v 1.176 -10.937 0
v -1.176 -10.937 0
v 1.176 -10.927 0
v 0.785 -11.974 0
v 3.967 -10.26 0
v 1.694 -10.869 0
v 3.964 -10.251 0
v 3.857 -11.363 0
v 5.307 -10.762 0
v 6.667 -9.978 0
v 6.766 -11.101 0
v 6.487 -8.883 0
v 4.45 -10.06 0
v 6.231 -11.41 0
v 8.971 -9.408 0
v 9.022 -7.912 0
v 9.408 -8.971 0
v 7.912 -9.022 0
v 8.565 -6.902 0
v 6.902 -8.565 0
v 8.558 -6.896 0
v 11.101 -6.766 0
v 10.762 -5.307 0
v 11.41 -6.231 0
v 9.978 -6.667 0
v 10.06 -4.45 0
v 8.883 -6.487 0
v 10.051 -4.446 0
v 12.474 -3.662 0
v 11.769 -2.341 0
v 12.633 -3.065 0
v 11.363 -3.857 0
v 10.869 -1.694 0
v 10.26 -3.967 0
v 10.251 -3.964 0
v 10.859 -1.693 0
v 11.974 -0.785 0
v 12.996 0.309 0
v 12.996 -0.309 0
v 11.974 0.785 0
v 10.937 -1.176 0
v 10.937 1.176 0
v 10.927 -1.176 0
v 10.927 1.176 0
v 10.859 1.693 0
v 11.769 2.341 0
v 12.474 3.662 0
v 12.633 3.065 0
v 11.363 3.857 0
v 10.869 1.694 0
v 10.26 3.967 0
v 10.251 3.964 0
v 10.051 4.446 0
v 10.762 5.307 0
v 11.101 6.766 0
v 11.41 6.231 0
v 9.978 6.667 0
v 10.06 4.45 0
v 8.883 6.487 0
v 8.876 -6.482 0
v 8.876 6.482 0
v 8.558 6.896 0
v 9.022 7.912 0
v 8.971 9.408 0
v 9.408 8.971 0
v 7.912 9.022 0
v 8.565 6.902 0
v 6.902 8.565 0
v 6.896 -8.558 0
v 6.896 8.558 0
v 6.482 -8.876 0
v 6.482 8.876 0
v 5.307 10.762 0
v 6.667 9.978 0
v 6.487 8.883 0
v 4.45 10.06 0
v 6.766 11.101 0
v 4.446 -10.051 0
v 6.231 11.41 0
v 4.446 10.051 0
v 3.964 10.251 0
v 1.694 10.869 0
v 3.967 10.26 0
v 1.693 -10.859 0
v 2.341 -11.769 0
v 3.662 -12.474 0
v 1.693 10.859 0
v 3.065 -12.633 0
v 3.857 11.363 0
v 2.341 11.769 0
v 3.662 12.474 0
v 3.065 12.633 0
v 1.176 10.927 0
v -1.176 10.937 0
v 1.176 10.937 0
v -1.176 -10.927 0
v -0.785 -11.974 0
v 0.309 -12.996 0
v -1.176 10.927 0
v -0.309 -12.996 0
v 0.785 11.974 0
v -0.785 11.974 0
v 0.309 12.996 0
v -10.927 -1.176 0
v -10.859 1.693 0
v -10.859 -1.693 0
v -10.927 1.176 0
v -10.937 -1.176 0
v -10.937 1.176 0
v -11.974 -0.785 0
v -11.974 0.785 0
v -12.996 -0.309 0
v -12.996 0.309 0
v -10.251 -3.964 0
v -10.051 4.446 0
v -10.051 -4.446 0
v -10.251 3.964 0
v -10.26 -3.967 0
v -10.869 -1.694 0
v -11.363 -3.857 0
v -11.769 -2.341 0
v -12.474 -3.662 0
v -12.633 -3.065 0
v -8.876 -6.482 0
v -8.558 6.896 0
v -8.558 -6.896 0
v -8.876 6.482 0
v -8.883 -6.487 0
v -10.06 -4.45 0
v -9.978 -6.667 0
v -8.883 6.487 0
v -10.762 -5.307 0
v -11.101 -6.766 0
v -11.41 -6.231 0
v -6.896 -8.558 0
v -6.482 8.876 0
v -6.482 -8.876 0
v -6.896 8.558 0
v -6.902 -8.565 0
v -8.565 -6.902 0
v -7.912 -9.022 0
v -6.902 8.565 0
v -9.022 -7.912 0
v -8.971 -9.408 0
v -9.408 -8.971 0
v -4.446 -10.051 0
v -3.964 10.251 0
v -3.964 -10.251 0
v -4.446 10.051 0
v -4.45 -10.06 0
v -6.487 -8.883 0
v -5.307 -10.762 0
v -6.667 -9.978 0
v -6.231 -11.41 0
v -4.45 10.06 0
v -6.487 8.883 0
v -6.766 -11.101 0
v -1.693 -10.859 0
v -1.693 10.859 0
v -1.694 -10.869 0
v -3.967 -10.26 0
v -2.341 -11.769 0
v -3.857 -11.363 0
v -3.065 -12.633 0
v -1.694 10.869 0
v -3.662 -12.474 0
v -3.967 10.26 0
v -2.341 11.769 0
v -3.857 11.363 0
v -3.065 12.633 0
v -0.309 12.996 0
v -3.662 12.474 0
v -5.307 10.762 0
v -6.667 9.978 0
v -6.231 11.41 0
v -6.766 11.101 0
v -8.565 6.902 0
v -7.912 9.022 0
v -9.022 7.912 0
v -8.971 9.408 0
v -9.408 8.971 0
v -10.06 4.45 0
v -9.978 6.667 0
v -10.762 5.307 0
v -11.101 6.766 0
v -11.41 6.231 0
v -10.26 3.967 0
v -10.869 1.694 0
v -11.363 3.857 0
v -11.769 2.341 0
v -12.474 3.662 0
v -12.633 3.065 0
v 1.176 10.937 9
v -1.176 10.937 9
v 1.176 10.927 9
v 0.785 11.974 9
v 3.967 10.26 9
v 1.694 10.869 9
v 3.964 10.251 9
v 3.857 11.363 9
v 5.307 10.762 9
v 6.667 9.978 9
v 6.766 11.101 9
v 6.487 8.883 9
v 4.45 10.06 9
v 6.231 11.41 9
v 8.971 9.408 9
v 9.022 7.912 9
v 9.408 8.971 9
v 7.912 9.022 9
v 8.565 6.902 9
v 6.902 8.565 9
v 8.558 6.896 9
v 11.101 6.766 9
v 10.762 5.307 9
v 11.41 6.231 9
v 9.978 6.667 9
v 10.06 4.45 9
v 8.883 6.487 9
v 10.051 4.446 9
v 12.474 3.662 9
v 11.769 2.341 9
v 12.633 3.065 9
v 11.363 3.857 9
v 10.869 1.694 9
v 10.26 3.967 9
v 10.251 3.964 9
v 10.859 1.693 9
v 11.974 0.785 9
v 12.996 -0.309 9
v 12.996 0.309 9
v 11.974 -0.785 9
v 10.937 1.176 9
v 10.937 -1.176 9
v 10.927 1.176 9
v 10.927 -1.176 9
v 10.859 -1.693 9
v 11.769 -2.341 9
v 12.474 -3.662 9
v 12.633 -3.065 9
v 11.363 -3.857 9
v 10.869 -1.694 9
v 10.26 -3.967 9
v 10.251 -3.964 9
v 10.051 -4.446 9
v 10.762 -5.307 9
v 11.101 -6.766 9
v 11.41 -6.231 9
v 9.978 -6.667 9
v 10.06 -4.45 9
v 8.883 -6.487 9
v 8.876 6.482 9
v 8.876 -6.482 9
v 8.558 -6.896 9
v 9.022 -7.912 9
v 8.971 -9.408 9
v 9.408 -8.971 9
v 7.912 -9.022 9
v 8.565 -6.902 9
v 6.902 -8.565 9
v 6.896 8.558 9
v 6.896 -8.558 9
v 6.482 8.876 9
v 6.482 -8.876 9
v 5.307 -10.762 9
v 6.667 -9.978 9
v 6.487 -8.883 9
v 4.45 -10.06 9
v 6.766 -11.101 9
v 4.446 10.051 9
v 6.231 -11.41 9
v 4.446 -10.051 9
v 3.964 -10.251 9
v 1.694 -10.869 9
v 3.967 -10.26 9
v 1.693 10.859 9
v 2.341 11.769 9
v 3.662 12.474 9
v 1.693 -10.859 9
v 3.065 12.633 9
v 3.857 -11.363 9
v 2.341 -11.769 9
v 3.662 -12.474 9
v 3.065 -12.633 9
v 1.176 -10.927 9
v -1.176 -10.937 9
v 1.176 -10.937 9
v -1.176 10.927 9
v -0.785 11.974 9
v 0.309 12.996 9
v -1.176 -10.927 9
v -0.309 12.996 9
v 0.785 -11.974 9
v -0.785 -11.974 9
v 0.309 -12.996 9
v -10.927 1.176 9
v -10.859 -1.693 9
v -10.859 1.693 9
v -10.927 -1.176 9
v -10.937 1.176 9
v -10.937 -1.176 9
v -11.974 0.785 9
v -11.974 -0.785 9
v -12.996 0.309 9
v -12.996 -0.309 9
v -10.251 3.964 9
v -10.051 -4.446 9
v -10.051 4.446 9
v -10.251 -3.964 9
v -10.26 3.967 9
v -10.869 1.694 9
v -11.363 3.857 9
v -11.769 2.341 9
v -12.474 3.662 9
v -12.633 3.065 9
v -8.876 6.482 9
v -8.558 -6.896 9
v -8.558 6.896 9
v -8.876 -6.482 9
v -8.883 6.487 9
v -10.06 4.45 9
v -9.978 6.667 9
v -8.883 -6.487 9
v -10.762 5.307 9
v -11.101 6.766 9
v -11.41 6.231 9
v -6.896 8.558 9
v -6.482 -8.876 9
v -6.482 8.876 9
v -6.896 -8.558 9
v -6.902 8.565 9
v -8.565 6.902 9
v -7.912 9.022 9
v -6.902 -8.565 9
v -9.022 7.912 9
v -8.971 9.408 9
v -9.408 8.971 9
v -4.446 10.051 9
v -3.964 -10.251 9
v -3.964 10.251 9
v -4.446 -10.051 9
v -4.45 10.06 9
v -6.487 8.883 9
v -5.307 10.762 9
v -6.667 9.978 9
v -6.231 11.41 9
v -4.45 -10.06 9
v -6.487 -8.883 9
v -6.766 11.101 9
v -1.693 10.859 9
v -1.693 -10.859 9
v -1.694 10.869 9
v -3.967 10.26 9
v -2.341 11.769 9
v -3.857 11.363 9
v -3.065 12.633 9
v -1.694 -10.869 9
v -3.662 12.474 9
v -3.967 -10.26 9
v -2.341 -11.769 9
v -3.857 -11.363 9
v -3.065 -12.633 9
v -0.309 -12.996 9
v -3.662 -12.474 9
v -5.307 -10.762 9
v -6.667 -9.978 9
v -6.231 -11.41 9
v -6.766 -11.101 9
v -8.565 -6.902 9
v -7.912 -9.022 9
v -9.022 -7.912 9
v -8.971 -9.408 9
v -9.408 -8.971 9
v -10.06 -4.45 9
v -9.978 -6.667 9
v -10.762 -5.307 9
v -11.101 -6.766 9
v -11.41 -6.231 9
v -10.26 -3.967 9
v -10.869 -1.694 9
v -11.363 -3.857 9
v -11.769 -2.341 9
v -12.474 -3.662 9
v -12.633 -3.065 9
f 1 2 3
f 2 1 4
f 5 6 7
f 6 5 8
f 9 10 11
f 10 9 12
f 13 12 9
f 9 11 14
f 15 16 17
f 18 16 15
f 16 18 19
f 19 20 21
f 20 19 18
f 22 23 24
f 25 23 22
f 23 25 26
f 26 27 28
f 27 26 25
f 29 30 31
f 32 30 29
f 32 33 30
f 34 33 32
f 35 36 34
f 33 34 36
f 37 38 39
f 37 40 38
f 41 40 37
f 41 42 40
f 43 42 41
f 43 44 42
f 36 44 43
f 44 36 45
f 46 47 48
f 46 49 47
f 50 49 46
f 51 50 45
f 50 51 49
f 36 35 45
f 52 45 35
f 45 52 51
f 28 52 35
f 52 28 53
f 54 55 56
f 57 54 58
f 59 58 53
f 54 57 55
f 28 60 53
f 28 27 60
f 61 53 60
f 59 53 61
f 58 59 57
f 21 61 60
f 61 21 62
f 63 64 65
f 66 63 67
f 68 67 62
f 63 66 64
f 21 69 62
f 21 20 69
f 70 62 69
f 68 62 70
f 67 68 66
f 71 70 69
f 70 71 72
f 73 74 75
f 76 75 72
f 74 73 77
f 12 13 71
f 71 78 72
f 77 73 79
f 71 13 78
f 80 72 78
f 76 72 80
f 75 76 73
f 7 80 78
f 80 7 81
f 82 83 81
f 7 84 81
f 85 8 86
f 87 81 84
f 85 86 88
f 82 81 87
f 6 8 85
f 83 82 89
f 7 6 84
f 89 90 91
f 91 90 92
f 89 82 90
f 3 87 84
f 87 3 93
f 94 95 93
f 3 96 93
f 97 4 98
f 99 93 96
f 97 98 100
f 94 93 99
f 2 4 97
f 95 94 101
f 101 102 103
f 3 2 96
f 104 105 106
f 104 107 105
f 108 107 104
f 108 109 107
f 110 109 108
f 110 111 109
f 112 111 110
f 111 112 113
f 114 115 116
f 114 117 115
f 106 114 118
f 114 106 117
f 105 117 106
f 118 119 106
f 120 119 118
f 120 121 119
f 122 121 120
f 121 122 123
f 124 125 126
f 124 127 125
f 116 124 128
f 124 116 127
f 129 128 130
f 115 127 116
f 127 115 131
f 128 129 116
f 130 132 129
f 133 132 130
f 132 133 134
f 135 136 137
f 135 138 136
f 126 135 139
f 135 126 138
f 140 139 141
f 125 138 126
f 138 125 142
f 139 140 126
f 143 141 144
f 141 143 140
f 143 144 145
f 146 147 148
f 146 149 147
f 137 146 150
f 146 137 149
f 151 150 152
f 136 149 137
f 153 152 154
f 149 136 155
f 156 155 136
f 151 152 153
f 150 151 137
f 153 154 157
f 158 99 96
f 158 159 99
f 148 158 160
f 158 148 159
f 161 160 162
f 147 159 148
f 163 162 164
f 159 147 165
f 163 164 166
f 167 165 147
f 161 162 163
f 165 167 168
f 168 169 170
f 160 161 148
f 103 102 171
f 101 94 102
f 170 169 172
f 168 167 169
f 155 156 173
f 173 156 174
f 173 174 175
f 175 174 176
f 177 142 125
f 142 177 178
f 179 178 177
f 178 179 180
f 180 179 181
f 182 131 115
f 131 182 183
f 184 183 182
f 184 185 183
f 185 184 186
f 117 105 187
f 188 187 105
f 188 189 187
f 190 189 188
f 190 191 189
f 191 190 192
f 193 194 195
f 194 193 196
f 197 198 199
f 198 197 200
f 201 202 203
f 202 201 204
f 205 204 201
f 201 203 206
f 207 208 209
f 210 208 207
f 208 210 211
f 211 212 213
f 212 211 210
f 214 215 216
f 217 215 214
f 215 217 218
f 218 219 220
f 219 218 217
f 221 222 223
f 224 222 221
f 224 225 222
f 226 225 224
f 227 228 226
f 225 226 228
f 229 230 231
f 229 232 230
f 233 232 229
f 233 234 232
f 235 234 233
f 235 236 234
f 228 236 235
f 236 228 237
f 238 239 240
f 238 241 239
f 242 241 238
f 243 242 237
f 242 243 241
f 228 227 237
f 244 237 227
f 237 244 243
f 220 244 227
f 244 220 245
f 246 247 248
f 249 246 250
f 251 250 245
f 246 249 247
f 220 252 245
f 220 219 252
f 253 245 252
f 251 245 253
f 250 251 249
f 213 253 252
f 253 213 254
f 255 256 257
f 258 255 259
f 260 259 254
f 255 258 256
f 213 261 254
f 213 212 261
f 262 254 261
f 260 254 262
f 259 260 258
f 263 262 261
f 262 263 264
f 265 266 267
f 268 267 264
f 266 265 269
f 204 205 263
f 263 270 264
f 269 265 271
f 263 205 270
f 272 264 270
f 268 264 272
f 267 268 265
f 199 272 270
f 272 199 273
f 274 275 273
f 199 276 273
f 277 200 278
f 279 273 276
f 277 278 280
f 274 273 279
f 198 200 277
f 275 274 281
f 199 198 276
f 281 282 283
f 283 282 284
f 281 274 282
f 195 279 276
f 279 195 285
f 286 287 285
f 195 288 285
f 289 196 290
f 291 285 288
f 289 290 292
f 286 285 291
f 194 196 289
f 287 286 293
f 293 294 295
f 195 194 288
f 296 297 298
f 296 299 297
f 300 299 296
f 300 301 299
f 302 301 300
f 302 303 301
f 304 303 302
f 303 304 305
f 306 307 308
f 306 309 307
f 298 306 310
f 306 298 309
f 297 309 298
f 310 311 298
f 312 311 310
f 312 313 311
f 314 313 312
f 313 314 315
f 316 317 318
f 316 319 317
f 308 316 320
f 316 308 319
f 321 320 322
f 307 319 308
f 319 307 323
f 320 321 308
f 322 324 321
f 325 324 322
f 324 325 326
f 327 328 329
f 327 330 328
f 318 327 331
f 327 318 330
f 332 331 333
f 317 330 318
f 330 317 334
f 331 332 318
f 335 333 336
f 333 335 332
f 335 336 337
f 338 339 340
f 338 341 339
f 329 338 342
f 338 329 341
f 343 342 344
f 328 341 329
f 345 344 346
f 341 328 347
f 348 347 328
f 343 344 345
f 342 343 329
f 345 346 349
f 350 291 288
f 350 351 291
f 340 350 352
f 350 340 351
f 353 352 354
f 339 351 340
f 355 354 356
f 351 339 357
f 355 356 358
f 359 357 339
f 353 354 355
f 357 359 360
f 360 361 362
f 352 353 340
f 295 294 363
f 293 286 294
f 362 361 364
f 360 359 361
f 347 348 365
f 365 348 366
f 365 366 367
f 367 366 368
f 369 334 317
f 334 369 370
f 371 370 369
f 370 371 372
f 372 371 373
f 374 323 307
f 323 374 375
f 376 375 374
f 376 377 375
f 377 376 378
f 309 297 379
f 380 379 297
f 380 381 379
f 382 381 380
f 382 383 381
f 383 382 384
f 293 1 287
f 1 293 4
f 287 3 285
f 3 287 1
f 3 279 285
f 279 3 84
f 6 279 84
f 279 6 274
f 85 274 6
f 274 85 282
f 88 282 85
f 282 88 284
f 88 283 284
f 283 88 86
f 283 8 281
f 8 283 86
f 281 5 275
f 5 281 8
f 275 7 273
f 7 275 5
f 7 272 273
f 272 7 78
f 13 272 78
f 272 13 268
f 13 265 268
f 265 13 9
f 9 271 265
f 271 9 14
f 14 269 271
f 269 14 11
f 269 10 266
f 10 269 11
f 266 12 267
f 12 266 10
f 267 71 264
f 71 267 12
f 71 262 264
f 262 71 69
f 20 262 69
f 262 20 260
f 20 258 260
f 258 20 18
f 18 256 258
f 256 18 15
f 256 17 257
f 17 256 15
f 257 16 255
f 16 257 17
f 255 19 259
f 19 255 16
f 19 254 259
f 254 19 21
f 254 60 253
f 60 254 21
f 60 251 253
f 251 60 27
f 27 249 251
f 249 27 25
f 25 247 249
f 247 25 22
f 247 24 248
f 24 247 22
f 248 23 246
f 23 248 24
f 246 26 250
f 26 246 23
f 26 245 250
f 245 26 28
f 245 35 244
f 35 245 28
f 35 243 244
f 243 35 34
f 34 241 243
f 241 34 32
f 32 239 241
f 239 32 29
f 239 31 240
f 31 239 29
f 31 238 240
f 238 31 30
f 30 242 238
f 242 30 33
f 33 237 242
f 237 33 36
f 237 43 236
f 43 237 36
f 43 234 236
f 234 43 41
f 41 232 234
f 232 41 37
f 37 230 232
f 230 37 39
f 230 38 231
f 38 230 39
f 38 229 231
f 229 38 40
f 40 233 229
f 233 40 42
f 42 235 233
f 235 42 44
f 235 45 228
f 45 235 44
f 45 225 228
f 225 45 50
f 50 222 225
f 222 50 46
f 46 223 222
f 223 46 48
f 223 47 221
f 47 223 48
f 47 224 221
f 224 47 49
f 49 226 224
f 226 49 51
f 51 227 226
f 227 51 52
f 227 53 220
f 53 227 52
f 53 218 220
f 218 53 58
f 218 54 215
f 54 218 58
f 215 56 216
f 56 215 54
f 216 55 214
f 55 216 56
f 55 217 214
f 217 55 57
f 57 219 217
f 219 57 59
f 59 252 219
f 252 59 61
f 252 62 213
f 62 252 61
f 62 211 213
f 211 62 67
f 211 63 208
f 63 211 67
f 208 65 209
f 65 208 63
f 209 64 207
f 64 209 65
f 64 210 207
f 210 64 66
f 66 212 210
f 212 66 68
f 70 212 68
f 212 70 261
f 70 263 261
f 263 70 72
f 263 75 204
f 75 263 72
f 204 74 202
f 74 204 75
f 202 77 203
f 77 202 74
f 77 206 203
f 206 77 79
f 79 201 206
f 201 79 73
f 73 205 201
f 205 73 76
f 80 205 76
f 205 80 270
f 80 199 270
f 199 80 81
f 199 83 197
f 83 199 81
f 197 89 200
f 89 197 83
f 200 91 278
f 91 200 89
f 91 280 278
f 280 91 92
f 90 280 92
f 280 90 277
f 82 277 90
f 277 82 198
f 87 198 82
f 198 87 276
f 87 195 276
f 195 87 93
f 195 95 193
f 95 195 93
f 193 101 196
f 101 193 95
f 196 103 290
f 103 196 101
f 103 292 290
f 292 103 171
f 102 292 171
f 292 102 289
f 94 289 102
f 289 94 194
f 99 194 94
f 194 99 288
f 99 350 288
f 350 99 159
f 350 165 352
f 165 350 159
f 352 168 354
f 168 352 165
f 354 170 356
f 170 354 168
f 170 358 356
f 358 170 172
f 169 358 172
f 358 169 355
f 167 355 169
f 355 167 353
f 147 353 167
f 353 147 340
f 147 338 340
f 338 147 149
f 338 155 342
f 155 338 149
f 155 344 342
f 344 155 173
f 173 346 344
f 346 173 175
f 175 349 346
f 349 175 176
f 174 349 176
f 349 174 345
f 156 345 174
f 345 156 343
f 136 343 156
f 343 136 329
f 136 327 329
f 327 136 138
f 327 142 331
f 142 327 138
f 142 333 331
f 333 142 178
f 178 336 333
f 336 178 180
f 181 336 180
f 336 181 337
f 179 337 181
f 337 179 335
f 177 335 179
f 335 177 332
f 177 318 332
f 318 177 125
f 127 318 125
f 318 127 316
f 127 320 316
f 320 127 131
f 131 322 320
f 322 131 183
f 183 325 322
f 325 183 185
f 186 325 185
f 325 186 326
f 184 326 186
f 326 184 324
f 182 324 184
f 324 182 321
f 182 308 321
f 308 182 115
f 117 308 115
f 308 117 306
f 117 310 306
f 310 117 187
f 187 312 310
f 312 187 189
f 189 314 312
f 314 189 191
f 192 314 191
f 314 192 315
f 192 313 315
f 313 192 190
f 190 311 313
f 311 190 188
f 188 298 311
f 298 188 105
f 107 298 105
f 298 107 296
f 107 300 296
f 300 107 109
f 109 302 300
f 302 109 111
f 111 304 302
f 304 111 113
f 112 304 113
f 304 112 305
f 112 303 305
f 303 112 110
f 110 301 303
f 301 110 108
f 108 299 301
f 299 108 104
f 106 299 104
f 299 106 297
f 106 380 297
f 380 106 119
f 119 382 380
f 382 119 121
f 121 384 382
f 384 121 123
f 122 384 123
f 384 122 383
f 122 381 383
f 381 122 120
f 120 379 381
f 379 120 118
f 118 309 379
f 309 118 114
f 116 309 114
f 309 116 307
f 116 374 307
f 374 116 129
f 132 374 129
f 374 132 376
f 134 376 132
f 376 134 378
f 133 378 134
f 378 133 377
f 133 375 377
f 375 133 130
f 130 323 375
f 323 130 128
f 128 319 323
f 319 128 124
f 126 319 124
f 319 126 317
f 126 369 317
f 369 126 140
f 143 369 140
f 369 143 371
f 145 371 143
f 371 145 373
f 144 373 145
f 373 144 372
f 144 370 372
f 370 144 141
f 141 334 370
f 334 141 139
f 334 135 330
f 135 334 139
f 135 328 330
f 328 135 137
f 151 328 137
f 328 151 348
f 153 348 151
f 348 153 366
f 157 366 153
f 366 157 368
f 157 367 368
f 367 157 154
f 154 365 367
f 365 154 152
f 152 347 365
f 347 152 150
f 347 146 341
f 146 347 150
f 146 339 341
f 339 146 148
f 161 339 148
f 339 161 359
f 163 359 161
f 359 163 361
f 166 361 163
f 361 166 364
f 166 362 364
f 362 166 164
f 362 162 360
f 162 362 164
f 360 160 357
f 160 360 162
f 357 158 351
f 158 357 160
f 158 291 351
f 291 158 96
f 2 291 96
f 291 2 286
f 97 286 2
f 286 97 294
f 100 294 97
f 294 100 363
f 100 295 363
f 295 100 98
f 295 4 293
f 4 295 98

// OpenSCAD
// Edited for Celestron telescope control as I wanted a solid gear, with
// Lego looking a nice tooth size
// Original source, Brian Jepson and Robert Munafo:
//   https://www.thingiverse.com/thing:40410/files
// Also reports the outer diameter for planning

// Alorithmic LEGO(r) Technic compatible gear generator
//
// NOTE regarding Patents: Since 1977 the LEGO Group has produced "Technic"
// elements with gear teeth, axles, axle-holes, and other features closely
// resembling the design(s) in this file, as part of their "Expert Builder"
// and "Technical Sets", now called "Technic" (see for example set 961,
// peeron.com/inv/sets/961-1?showpic=9288 ). By 1989 they had added pieces
// with rounded ends (see peeron.com/inv/sets/5264-1?showpic=8542 (set 5264
// from 1987) and peeron.com/inv/sets/5110-2?showpic=8543 (set 5110 from 1989))
// The object(s) produced by this SCAD file are different from real LEGO(r)
// elements, and any similarities of features, such as the shapes of axles
// and axle-holes, are functional in nature. The functions in question
// resemble those in LEGO patents that have already expired (or, if not
// patented, became prior art when the product(s) became available for
// purchase, i.e. 1989 at the latest). Nevertheless, one must not infringe
// on non-expired patents and any non-patent rights, such as LEGO(r)
// trademarks and brand identity. An example of such infringement would be
// to make objects and then try to "pass them off" as LEGO products. See
// for example the Kirkbi AG v. Ritvik Holdings Inc. case, (Supreme Court of
// Canada [2005] 3 S.C.R. 302).
//
// This was originally created by user bjepson on Thingiverse (thing 29989),
// then heavily modified and expanded by Robert Munafo:
//  20121226: separate parameters for rows/columns of cylinder holes and of
//            "plus-shaped" holes
//          * Rotate the holes by 20 degrees to take advantage of
//            edge dithering both for improved hole width resolution
//            and to provide a rough surface which better grips the
//            smooth axles.
//          * You can now get more than just a single row of plus-holes
//            in each direction
//
//  20130105: added MCAD functions to make this file work all by itself (no
//            need to hunt down missing pieces elsewhere)
//          * More accurate axle hole dimensions
//          * Round holes are actually round now (imagine that!)
//          * Automatically determines correct parameters for number and placement
//            of holes, based on number of teeth
//
//  20130106: fix small glitch seen at junction of fillet and bottom land (for
//            illustration of the problem, see "0106-fix.jpg" at
//            thingiverse.com/thing:40410)

// 32 teeth is the real "missing" gear size, because all the other
// multiples of 8 are available. An argument can also be made for 28 (which
// however is available in the new small turntable) or any other multiple of 4
// because the official gears are all multiples of 4, namely: 8, 12, 16,
// 20, 24, 28(turntable), 36, 40 and 56(big turntable).
//
// For my orrery designs ( see mrob.com/orrery ) I might use any integer
// number of teeth from 8 up to around 60 or 70.
//
// The holes parameters need to be chosen a certain way. To get a normal style
// gear with a + hole in the middle, the plus_row and plus_col should both
// be odd, and the holes_row, holes_col should both be even. To get a round
// hole in the center, do it the other way 'round. Then invoke it as
// myGearParamed(n_teeth, holes_row, holes_col, plus_row, plus_col)
//
// Examples:
//          my 20 gear: holes_row=2, holes_col=2, plus_row=1, plus_col=1
//    Standard 24 gear: holes_row=2, holes_col=2, plus_row=1, plus_col=1
//          my 28 gear: holes_row=2, holes_col=2, plus_row=3, plus_col=1
//          my 32 gear: holes_row=2, holes_col=2, plus_row=3, plus_col=3
// nonstandard 36 gear: holes_row=2, holes_col=2, plus_row=3, plus_col=3
//    Standard 40 gear: holes_row=4, holes_col=2, plus_row=3, plus_col=3
//          my 44 gear: holes_row=4, holes_col=2, plus_row=3, plus_col=3
//          my 48 gear: holes_row=4, holes_col=4, plus_row=5, plus_col=3
//
// By default, the myGear function chooses the best values for all the holes paramters
// based on the number of teeth.

// As an example, make one gear.
//myGear(24);
myGearSolid(24, gearHeight=9);

/*module myGear(n_teeth) {
  if (n_teeth >= 56) {
    myGearParamed(n_teeth, 6, 4, 5, 5);
  } else if (n_teeth >= 48) {
    myGearParamed(n_teeth, 4, 4, 5, 3);
  } else if (n_teeth >= 40) {
    myGearParamed(n_teeth, 4, 2, 3, 3);
  } else if (n_teeth >= 32) {
    myGearParamed(n_teeth, 2, 2, 3, 3);
  } else if (n_teeth >= 26) {
    myGearParamed(n_teeth, 2, 2, 3, 1);
  } else if (n_teeth >= 21) {
    myGearParamed(n_teeth, 2, 2, 1, 1);
  } else {
    myGearParamed(n_teeth, 0, 0, 1, 1);
  }
}
*/

//module myGearParamed(num_teeth, holes_row, holes_col, plus_row, plus_col)
module myGearSolid(num_teeth, gearHeight=3.67)
{
  // Set the holes all to zero
  holes_row=0;
  holes_col=0;
  plus_row=0;
  plus_col=0;
    
  jaggy_angle = 20;
  beam_width = 7.8;  // Needs to be a bit less than the LEGO stud spacing = 7.99 mm
  //gearHeight = 3.67;

  axle_gap = 1.9;   // axle thickness is actually about 1.8 mm
  hole_radius = 2.65;

  difference() {
    linear_extrude(height = gearHeight, center = false, convexity = 10, twist = 0) {
      gear(number_of_teeth=num_teeth,
        diametral_pitch=1, 
        pressure_angle=88, 
        clearance = 0);
    }

    // We do two rectangular grids of holes, rotate 90 degrees and do them
    // again.
    for (i = [jaggy_angle, jaggy_angle+90]) {
      rotate([0,0,i]) {
        // Cut the cross-axle holes (8.0mm = stud spacing)
        if (plus_row > 0) {
          for (x=[-4 * (plus_row - 1 ): 8.0 : 4 * (plus_row -1 )]) {
            for (y=[-4 * (plus_col - 1 ): 8.0 : 4 * (plus_col -1)]) {
              translate([x - hole_radius, y - axle_gap/2, 0])
                #roundedRect([hole_radius * 2, axle_gap, gearHeight], .2);
              translate([x - axle_gap/2, y - hole_radius, 0])
                #roundedRect([axle_gap, hole_radius * 2, gearHeight], .2);
            }
          }
        }

        if (holes_row > 0) {
          // Cut the round holes
          for (x=[-4 * (holes_row-1) : 8.0 : 4 * (holes_row-1)]) {
            for (y=[-4 * (holes_col-1) : 8.0 : 4 * (holes_col-1)]) {
              translate([x, y, 0]) {
                #cylinder(r=hole_radius, h = gearHeight, $fs=0.5);
              }
            }
          }
        }

      }
    }

  }
}


// ---------------------------------------------------------------------------------
//
// module for rounded rectangles by tlrobinson on Thingiverse in a 
// comment posted to http://www.thingiverse.com/thing:9347 on March
// 29, 2012, 3:57:46 AM EDT
//
module roundedRect(size, radius) {  
  x = size[0];  
  y = size[1];  
  z = size[2];  
 
  linear_extrude(height=z)  
  hull() {  
    translate([radius, radius, 0])  
      circle(r=radius);  
 
    translate([x - radius, radius, 0])  
      circle(r=radius);  
 
    translate([x - radius, y - radius, 0])  
      circle(r=radius);  
 
    translate([radius, y - radius, 0])  
      circle(r=radius);  
  }  
}


// ---------------------------------------------------------------------------------
//
// The following functions (gear, involute_gear_tooth and two minor functions)
// are taken from the "gears.scad" file in the "MCAD" package, which is available
// at https://github.com/D1plo1d/MCAD

// Geometry Sources:
//  http://www.cartertools.com/involute.html
//  gears.py (inkscape extension: /usr/share/inkscape/extensions/gears.py)
// Usage:
//  Diametral pitch: Number of teeth per unit length.
//  Circular pitch: Length of the arc from one tooth to the next
//  Clearance: Radial distance between top of tooth on one gear to bottom of gap on another.

module gear(number_of_teeth,
    circular_pitch=false, diametral_pitch=false,
    pressure_angle=20, clearance = 0)
{
  if (circular_pitch==false && diametral_pitch==false) echo("MCAD ERROR: gear module needs either a diametral_pitch or circular_pitch");
  
  //Convert diametrial pitch to our native circular pitch
  circular_pitch = (circular_pitch!=false?circular_pitch:180/diametral_pitch);
  
  // Pitch diameter: Diameter of pitch circle.
  pitch_diameter  =  number_of_teeth * circular_pitch / 180;
  pitch_radius = pitch_diameter/2;
  
  // Base Circle
  base_diameter = pitch_diameter*cos(pressure_angle);
  base_radius = base_diameter/2;

  // Diametrial pitch: Number of teeth per unit length.
  pitch_diametrial = number_of_teeth / pitch_diameter;

  // Addendum: Radial distance from pitch circle to outside circle.
  addendum = 1/pitch_diametrial;
  
  //Outer Circle
  outer_radius = pitch_radius+addendum;
  outer_diameter = outer_radius*2;
  echo("outer_diameter=", outer_diameter);
  
  // Dedendum: Radial distance from pitch circle to root diameter
  dedendum = addendum + clearance;

  // Root diameter: Diameter of bottom of tooth spaces.
  root_radius = pitch_radius-dedendum;
  root_diameter = root_radius * 2;
  
  half_thick_angle = 360 / (4 * number_of_teeth);
  
  union() {
    rotate(half_thick_angle)
      circle($fn=number_of_teeth*2, r=root_radius*1.001);
    
    for (i= [1:number_of_teeth]) {  //for (i = [0])
      rotate([0,0,i*360/number_of_teeth]) {
        involute_gear_tooth(
          pitch_radius = pitch_radius,
          root_radius = root_radius,
          base_radius = base_radius,
          outer_radius = outer_radius,
          half_thick_angle = half_thick_angle);
      } // end of rotate(){}
    } // end of for(){}
  } // end of union(){}
} // end of module gear

module involute_gear_tooth(
          pitch_radius,
          root_radius,
          base_radius,
          outer_radius,
          half_thick_angle
          )
{
  pitch_to_base_angle  = involute_intersect_angle( base_radius, pitch_radius );
  
  outer_to_base_angle = involute_intersect_angle( base_radius, outer_radius );
  
  base1 = 0 - pitch_to_base_angle - half_thick_angle;
  pitch1 = 0 - half_thick_angle;
  outer1 = outer_to_base_angle - pitch_to_base_angle - half_thick_angle;
  
  b1 = polar_to_cartesian([ base1, base_radius ]);
  p1 = polar_to_cartesian([ pitch1, pitch_radius ]);
  o1 = polar_to_cartesian([ outer1, outer_radius ]);
  
  b2 = polar_to_cartesian([ -base1, base_radius ]);
  p2 = polar_to_cartesian([ -pitch1, pitch_radius ]);
  o2 = polar_to_cartesian([ -outer1, outer_radius ]);
  
  // set up values for ( root_radius > base_radius ) case
    pitch_to_root_angle = pitch_to_base_angle - involute_intersect_angle(base_radius, root_radius );
    root1 = pitch1 - pitch_to_root_angle;
    root2 = -pitch1 + pitch_to_root_angle;
    r1_t =  polar_to_cartesian([ root1, root_radius ]);
    r2_t =  polar_to_cartesian([ -root1, root_radius ]);
  
  // set up values for ( else ) case
    r1_f =  polar_to_cartesian([ base1, root_radius ]);
    r2_f =  polar_to_cartesian([ -base1, root_radius ]);
  
  if (root_radius > base_radius) {
    polygon( points = [
      b1, r1_t,p1,o1,o2,p2,r2_t, b2
    ], convexity = 3);
  } else {
    polygon( points = [
      r1_f, b1,p1,o1,o2,p2,b2,r2_f
    ], convexity = 3);
  }
  
}

// Mathematical Functions
//===============

// Finds the angle of the involute about the base radius at the given distance (radius) from its center.
//source: http://www.mathhelpforum.com/math-help/geometry/136011-circle-involute-solving-y-any-given-x.html

function involute_intersect_angle(base_radius, radius) = sqrt( pow(radius/base_radius,2) - 1);



// Polar coord [angle, radius] to cartesian coord [x,y]

function polar_to_cartesian(polar) = [
  polar[1]*cos(polar[0]),
  polar[1]*sin(polar[0])
];
